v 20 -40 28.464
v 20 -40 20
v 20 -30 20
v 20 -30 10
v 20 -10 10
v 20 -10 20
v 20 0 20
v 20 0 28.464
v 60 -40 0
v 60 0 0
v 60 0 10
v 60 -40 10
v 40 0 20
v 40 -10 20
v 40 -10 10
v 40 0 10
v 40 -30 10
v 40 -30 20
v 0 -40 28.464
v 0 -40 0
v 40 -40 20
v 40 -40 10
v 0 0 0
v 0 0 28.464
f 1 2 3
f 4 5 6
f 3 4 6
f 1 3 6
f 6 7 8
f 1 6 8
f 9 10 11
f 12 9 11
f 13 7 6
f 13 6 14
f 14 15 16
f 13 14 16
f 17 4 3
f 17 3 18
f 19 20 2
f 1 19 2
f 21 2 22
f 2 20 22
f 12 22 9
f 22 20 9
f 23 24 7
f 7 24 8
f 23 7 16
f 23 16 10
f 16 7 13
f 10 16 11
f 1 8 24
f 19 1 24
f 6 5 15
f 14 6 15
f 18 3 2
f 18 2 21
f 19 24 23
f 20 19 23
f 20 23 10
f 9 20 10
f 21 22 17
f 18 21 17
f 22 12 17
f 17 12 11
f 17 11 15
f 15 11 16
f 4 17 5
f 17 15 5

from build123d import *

# Parameters (mm, degrees)
F1_DEPTH = 40
F2_W     = 20
F2_H     = 10
F3_DEPTH = 10
F4_W     = 20
F4_H     = 10
F5_DEPTH = 10


with BuildPart() as f1:
    # F0 (on Front) → F1 (new body)
    with BuildSketch(Plane.XZ):
        Polygon((0, 28.463914), (0, 0), (60, 0), (60, 10), (20, 10), (20, 28.463914), align=None)
    extrude(amount=F1_DEPTH)

    # F2 (on face) → F3 (join)
    with BuildSketch(Plane.XY.offset(10)):
        with Locations((30, -35)):
            Rectangle(F2_W, F2_H)
    extrude(amount=F3_DEPTH)

    # F4 (on face) → F5 (join)
    with BuildSketch(Plane.XY.offset(10)):
        with Locations((30, -5)):
            Rectangle(F4_W, F4_H)
    extrude(amount=F5_DEPTH)


solid = f1.part
